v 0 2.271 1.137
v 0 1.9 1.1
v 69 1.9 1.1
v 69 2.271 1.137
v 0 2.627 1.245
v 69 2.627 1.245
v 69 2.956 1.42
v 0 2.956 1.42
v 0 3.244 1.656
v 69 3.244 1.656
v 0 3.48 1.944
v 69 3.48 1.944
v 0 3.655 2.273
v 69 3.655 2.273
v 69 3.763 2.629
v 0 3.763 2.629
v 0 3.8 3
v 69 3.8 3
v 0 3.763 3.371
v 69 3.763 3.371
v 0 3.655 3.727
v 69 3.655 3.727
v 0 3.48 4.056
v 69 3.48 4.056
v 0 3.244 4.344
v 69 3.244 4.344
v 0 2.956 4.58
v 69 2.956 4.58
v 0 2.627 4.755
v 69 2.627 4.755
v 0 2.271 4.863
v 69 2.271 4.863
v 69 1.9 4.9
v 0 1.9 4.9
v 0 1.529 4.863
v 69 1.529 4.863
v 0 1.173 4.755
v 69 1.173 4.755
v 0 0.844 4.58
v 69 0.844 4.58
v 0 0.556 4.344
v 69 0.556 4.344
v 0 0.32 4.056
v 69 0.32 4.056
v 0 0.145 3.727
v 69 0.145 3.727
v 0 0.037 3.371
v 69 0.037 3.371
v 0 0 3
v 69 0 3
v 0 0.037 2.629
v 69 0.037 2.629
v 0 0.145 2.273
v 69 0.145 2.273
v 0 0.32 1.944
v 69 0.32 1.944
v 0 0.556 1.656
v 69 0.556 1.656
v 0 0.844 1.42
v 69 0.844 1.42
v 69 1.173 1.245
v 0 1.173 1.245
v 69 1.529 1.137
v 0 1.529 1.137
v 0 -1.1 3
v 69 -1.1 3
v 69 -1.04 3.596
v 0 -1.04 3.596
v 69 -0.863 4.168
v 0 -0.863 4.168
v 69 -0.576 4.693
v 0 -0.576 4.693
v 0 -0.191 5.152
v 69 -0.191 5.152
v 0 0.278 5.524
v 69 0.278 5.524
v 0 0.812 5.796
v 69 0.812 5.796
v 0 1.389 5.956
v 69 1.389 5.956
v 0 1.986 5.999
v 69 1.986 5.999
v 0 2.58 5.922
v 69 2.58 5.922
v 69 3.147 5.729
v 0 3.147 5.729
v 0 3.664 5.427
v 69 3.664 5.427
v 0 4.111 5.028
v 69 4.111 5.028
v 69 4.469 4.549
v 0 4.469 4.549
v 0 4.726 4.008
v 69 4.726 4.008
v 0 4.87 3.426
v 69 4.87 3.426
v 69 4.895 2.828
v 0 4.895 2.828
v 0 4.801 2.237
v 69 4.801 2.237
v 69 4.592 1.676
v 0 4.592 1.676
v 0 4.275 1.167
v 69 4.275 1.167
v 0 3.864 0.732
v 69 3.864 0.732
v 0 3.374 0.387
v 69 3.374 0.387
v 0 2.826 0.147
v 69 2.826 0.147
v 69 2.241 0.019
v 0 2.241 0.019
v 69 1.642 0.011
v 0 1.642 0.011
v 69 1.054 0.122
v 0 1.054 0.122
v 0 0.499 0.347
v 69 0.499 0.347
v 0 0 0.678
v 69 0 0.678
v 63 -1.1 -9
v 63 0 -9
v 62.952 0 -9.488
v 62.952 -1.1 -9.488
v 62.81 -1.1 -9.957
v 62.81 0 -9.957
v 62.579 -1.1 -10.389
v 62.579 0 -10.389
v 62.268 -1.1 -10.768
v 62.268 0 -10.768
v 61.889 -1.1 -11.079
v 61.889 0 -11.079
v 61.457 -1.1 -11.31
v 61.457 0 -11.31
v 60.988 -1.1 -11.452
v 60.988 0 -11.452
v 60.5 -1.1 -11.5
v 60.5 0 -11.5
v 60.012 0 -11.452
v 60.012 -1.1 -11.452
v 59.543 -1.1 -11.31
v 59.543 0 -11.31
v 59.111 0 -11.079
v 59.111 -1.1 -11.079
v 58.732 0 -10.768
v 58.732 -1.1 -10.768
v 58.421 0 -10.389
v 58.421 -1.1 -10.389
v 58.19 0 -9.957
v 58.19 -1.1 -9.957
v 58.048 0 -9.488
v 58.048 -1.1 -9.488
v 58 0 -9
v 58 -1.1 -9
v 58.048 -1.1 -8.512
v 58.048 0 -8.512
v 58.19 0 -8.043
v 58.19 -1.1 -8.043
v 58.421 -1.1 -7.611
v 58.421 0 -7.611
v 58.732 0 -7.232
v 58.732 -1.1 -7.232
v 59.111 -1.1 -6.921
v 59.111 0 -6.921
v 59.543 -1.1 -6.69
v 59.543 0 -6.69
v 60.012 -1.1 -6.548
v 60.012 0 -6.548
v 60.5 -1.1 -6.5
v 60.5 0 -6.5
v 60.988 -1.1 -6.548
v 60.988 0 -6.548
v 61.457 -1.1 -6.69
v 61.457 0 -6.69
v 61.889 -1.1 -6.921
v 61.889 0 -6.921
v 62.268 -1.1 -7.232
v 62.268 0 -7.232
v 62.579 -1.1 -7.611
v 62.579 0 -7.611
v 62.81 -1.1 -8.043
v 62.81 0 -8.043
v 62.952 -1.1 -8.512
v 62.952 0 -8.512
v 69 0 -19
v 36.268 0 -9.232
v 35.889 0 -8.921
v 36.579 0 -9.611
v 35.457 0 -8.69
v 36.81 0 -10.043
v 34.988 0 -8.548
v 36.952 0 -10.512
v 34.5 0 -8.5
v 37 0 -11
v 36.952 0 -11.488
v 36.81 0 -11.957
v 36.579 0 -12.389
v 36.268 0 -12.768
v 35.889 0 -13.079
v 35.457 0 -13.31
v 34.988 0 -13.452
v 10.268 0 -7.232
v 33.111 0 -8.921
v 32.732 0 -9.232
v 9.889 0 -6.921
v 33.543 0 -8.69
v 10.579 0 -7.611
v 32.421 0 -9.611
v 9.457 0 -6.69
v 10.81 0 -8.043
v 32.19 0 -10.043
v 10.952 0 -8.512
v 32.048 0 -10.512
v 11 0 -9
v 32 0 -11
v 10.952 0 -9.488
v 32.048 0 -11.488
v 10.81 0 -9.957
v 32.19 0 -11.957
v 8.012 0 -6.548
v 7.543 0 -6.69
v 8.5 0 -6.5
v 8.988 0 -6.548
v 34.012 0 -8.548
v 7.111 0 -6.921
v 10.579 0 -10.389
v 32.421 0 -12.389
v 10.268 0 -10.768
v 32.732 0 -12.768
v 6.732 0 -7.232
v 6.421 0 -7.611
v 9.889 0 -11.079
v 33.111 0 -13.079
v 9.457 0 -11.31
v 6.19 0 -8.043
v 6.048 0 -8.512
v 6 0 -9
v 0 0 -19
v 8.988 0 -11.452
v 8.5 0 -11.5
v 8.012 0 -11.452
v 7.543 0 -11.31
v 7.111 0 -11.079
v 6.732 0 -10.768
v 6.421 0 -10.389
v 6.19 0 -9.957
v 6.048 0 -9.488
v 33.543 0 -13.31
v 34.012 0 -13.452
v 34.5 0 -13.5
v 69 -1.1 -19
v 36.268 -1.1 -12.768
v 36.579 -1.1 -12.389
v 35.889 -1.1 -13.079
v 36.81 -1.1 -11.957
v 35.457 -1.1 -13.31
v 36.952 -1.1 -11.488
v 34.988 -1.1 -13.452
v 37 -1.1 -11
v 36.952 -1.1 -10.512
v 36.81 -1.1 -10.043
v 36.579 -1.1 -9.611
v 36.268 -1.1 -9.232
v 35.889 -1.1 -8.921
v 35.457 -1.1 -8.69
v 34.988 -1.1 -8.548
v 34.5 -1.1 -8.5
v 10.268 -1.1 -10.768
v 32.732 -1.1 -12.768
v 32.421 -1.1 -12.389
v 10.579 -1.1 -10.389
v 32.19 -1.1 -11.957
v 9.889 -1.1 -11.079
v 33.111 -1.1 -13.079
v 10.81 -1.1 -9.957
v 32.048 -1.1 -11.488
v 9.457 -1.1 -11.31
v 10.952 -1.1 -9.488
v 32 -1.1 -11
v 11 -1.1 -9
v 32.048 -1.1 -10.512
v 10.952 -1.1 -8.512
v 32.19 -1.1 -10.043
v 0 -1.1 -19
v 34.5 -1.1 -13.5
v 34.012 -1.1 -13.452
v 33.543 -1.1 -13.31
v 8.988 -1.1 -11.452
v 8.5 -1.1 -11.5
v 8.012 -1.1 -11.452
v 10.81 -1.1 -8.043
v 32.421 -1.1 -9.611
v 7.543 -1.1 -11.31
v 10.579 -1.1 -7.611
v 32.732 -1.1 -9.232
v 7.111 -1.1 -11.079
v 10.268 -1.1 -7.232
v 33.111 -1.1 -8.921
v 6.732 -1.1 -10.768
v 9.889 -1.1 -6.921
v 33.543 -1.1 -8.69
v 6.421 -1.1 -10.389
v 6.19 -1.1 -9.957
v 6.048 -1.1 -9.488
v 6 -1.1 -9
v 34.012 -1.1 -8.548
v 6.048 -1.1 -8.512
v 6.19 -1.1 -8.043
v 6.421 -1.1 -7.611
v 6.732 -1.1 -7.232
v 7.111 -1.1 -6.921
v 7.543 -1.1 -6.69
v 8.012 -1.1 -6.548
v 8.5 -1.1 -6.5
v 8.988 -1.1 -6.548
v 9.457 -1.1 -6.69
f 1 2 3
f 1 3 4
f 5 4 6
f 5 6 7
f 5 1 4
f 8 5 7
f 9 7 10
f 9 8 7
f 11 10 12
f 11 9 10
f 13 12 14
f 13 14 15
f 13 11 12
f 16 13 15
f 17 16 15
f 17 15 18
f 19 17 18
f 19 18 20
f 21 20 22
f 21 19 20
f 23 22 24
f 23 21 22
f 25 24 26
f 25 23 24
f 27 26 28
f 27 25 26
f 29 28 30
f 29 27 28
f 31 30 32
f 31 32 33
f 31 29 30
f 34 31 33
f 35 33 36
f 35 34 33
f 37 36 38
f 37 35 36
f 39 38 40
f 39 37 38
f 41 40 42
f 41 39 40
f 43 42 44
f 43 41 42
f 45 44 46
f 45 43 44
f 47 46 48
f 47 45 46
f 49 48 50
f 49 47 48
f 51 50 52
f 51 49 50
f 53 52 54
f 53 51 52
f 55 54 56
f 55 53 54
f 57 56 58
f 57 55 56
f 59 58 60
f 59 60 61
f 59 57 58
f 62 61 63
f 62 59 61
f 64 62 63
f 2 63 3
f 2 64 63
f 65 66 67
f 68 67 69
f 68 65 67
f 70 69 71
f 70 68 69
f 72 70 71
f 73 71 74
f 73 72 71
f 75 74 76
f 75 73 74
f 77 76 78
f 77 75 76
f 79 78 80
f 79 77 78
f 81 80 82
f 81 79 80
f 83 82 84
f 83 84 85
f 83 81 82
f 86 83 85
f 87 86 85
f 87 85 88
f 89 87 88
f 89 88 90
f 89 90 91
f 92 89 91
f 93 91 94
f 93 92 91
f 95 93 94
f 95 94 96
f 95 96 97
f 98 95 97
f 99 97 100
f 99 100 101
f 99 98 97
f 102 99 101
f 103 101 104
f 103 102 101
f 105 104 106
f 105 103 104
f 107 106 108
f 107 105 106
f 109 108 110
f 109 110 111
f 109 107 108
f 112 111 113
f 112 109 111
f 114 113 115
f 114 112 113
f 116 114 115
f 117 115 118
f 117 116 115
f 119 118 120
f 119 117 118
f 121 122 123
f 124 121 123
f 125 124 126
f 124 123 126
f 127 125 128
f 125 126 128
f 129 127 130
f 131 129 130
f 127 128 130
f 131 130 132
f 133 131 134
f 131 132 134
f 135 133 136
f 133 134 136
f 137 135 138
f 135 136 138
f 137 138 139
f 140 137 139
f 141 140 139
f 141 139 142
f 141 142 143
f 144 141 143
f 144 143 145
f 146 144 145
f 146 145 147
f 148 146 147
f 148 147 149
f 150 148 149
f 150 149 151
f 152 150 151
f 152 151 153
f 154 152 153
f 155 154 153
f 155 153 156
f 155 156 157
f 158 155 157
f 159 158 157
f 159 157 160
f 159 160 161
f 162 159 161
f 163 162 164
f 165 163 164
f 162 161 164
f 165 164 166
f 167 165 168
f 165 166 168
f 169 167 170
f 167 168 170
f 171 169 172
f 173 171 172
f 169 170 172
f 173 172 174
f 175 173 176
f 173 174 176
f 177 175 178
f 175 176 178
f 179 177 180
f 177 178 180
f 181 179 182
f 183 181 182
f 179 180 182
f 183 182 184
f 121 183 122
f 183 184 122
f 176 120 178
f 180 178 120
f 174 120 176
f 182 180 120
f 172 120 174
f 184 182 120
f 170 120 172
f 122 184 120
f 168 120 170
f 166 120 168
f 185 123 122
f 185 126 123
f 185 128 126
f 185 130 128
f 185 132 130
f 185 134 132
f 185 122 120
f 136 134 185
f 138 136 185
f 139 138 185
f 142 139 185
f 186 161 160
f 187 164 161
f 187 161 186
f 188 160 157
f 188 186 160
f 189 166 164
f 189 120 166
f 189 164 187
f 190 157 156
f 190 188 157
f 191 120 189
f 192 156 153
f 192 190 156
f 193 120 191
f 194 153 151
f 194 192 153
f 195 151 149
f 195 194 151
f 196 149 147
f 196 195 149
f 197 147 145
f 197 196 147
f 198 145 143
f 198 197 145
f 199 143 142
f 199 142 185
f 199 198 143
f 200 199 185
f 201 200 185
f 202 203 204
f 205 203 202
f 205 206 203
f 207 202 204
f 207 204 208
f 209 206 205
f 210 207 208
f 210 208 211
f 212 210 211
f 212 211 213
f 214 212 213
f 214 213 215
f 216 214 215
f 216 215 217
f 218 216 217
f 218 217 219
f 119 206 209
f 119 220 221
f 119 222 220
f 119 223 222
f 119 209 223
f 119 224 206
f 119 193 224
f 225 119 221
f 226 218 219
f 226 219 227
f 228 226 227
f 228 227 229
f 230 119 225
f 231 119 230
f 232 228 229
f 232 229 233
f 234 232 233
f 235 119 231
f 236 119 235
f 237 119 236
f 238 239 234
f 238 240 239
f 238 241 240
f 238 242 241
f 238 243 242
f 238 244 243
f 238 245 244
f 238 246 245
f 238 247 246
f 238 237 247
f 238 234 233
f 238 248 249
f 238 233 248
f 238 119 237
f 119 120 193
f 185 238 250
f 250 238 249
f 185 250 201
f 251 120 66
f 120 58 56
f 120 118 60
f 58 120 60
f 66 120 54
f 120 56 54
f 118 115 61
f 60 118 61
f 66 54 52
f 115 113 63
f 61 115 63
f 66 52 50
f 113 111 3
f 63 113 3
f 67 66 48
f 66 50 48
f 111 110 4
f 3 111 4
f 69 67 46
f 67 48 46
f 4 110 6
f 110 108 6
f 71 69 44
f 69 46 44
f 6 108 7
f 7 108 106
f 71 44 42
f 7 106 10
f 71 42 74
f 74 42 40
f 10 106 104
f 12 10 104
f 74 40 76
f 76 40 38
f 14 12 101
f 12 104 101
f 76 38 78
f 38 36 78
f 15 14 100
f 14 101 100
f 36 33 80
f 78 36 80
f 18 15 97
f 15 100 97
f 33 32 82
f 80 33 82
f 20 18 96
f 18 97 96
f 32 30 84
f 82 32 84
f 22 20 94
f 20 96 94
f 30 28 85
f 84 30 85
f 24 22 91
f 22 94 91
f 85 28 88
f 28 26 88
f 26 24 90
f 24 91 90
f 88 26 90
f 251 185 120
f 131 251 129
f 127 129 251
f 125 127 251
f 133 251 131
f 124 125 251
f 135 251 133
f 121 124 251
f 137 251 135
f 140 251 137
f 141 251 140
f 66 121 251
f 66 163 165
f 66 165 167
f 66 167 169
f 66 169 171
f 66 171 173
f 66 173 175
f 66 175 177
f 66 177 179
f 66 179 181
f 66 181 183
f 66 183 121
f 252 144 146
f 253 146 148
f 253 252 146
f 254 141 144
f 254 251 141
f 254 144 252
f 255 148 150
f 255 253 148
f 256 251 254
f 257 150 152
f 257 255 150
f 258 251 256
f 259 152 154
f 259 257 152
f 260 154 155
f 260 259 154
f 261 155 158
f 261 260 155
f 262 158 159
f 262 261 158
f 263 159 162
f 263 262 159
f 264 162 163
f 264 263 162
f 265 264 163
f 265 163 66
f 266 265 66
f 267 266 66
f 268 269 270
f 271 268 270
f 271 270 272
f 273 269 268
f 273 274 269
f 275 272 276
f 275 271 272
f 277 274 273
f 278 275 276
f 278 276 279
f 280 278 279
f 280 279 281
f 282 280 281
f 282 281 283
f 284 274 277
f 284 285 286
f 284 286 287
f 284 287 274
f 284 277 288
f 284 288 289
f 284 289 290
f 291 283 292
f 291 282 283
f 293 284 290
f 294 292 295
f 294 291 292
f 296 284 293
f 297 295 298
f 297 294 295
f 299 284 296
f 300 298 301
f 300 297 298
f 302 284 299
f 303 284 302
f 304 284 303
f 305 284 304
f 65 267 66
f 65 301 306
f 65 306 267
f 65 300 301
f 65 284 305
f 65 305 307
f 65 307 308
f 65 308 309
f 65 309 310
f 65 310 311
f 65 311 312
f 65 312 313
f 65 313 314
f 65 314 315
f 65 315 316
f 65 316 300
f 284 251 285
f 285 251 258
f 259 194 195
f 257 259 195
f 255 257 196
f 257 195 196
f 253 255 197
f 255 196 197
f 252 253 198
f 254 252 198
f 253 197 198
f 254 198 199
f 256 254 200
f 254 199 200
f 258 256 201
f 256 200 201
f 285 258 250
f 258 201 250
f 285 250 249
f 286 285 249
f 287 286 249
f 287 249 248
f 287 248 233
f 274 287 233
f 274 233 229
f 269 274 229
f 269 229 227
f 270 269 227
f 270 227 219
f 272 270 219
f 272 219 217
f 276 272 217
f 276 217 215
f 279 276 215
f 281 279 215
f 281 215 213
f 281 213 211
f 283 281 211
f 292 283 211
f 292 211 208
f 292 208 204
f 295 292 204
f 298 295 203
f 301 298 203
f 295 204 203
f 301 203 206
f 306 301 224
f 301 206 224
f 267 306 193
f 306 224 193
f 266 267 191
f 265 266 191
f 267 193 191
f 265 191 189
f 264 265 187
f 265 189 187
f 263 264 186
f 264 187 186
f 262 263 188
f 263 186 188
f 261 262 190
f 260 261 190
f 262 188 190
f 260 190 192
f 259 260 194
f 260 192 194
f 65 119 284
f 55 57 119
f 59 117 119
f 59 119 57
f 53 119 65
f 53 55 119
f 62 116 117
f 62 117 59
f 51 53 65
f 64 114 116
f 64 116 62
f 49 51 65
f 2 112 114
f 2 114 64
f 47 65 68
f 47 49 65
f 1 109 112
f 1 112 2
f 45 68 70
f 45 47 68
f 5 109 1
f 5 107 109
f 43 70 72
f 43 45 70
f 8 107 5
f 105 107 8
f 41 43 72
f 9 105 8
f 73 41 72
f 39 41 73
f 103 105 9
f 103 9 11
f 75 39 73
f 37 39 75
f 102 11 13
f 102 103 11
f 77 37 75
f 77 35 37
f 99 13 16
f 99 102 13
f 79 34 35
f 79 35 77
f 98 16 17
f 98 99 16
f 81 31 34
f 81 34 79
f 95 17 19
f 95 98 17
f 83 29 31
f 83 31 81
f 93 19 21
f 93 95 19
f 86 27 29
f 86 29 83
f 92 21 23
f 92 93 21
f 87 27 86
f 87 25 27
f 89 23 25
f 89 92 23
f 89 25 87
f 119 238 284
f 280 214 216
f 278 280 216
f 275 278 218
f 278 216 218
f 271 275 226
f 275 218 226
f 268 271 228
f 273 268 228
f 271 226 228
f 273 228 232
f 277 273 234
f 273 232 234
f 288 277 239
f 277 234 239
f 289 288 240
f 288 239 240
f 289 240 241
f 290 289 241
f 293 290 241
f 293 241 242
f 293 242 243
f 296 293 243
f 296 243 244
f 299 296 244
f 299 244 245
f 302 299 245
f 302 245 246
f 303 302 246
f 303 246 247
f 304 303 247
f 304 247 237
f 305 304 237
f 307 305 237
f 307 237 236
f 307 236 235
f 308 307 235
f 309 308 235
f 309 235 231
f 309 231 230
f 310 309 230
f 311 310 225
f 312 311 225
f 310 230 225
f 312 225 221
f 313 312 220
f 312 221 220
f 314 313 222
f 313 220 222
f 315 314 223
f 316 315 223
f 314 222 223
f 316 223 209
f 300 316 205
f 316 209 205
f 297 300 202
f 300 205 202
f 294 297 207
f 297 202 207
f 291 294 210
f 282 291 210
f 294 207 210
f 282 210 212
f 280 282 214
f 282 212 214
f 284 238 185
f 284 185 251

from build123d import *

# Parameters (mm, degrees)
SKETCH_1_R          = 1.9
EXTRUDE_1_DEPTH     = 69
SKETCH_2_R          = 2.5
CUT_EXTRUDE_1_DEPTH = 2.1


with BuildPart() as part:
    # 草图1 → 凸台-拉伸1 (new body)
    with BuildSketch(Plane(origin=(0, 0, 0), x_dir=(0, 0, -1), z_dir=(1, 0, 0))):
        with BuildLine():
            Line((0, 0), (19, 0))
            Line((19, 0), (19, -1.1))
            Line((19, -1.1), (0, -1.1))
            Line((0, -1.1), (-3, -1.1))
            ThreePointArc((-3, -1.1), (-4.284523258, 4.611088342), (-0.678362647, 0))
            Line((-0.678362647, 0), (0, 0))
        make_face()
        with Locations((-3, 1.9)):
            Circle(SKETCH_1_R, mode=Mode.SUBTRACT)
    extrude(amount=EXTRUDE_1_DEPTH)

    # 草图2 → 切除-拉伸1 (cut, through all)
    with BuildSketch(Plane(origin=(0, 0, 0), x_dir=(1, 0, 0), z_dir=(0, 1, 0))):
        with Locations((8.5, 9)):
            Circle(SKETCH_2_R)
        with Locations((60.5, 9)):
            Circle(SKETCH_2_R)
        with Locations((34.5, 11)):
            Circle(SKETCH_2_R)
    extrude(amount=-CUT_EXTRUDE_1_DEPTH, mode=Mode.SUBTRACT)


solid = part.part
